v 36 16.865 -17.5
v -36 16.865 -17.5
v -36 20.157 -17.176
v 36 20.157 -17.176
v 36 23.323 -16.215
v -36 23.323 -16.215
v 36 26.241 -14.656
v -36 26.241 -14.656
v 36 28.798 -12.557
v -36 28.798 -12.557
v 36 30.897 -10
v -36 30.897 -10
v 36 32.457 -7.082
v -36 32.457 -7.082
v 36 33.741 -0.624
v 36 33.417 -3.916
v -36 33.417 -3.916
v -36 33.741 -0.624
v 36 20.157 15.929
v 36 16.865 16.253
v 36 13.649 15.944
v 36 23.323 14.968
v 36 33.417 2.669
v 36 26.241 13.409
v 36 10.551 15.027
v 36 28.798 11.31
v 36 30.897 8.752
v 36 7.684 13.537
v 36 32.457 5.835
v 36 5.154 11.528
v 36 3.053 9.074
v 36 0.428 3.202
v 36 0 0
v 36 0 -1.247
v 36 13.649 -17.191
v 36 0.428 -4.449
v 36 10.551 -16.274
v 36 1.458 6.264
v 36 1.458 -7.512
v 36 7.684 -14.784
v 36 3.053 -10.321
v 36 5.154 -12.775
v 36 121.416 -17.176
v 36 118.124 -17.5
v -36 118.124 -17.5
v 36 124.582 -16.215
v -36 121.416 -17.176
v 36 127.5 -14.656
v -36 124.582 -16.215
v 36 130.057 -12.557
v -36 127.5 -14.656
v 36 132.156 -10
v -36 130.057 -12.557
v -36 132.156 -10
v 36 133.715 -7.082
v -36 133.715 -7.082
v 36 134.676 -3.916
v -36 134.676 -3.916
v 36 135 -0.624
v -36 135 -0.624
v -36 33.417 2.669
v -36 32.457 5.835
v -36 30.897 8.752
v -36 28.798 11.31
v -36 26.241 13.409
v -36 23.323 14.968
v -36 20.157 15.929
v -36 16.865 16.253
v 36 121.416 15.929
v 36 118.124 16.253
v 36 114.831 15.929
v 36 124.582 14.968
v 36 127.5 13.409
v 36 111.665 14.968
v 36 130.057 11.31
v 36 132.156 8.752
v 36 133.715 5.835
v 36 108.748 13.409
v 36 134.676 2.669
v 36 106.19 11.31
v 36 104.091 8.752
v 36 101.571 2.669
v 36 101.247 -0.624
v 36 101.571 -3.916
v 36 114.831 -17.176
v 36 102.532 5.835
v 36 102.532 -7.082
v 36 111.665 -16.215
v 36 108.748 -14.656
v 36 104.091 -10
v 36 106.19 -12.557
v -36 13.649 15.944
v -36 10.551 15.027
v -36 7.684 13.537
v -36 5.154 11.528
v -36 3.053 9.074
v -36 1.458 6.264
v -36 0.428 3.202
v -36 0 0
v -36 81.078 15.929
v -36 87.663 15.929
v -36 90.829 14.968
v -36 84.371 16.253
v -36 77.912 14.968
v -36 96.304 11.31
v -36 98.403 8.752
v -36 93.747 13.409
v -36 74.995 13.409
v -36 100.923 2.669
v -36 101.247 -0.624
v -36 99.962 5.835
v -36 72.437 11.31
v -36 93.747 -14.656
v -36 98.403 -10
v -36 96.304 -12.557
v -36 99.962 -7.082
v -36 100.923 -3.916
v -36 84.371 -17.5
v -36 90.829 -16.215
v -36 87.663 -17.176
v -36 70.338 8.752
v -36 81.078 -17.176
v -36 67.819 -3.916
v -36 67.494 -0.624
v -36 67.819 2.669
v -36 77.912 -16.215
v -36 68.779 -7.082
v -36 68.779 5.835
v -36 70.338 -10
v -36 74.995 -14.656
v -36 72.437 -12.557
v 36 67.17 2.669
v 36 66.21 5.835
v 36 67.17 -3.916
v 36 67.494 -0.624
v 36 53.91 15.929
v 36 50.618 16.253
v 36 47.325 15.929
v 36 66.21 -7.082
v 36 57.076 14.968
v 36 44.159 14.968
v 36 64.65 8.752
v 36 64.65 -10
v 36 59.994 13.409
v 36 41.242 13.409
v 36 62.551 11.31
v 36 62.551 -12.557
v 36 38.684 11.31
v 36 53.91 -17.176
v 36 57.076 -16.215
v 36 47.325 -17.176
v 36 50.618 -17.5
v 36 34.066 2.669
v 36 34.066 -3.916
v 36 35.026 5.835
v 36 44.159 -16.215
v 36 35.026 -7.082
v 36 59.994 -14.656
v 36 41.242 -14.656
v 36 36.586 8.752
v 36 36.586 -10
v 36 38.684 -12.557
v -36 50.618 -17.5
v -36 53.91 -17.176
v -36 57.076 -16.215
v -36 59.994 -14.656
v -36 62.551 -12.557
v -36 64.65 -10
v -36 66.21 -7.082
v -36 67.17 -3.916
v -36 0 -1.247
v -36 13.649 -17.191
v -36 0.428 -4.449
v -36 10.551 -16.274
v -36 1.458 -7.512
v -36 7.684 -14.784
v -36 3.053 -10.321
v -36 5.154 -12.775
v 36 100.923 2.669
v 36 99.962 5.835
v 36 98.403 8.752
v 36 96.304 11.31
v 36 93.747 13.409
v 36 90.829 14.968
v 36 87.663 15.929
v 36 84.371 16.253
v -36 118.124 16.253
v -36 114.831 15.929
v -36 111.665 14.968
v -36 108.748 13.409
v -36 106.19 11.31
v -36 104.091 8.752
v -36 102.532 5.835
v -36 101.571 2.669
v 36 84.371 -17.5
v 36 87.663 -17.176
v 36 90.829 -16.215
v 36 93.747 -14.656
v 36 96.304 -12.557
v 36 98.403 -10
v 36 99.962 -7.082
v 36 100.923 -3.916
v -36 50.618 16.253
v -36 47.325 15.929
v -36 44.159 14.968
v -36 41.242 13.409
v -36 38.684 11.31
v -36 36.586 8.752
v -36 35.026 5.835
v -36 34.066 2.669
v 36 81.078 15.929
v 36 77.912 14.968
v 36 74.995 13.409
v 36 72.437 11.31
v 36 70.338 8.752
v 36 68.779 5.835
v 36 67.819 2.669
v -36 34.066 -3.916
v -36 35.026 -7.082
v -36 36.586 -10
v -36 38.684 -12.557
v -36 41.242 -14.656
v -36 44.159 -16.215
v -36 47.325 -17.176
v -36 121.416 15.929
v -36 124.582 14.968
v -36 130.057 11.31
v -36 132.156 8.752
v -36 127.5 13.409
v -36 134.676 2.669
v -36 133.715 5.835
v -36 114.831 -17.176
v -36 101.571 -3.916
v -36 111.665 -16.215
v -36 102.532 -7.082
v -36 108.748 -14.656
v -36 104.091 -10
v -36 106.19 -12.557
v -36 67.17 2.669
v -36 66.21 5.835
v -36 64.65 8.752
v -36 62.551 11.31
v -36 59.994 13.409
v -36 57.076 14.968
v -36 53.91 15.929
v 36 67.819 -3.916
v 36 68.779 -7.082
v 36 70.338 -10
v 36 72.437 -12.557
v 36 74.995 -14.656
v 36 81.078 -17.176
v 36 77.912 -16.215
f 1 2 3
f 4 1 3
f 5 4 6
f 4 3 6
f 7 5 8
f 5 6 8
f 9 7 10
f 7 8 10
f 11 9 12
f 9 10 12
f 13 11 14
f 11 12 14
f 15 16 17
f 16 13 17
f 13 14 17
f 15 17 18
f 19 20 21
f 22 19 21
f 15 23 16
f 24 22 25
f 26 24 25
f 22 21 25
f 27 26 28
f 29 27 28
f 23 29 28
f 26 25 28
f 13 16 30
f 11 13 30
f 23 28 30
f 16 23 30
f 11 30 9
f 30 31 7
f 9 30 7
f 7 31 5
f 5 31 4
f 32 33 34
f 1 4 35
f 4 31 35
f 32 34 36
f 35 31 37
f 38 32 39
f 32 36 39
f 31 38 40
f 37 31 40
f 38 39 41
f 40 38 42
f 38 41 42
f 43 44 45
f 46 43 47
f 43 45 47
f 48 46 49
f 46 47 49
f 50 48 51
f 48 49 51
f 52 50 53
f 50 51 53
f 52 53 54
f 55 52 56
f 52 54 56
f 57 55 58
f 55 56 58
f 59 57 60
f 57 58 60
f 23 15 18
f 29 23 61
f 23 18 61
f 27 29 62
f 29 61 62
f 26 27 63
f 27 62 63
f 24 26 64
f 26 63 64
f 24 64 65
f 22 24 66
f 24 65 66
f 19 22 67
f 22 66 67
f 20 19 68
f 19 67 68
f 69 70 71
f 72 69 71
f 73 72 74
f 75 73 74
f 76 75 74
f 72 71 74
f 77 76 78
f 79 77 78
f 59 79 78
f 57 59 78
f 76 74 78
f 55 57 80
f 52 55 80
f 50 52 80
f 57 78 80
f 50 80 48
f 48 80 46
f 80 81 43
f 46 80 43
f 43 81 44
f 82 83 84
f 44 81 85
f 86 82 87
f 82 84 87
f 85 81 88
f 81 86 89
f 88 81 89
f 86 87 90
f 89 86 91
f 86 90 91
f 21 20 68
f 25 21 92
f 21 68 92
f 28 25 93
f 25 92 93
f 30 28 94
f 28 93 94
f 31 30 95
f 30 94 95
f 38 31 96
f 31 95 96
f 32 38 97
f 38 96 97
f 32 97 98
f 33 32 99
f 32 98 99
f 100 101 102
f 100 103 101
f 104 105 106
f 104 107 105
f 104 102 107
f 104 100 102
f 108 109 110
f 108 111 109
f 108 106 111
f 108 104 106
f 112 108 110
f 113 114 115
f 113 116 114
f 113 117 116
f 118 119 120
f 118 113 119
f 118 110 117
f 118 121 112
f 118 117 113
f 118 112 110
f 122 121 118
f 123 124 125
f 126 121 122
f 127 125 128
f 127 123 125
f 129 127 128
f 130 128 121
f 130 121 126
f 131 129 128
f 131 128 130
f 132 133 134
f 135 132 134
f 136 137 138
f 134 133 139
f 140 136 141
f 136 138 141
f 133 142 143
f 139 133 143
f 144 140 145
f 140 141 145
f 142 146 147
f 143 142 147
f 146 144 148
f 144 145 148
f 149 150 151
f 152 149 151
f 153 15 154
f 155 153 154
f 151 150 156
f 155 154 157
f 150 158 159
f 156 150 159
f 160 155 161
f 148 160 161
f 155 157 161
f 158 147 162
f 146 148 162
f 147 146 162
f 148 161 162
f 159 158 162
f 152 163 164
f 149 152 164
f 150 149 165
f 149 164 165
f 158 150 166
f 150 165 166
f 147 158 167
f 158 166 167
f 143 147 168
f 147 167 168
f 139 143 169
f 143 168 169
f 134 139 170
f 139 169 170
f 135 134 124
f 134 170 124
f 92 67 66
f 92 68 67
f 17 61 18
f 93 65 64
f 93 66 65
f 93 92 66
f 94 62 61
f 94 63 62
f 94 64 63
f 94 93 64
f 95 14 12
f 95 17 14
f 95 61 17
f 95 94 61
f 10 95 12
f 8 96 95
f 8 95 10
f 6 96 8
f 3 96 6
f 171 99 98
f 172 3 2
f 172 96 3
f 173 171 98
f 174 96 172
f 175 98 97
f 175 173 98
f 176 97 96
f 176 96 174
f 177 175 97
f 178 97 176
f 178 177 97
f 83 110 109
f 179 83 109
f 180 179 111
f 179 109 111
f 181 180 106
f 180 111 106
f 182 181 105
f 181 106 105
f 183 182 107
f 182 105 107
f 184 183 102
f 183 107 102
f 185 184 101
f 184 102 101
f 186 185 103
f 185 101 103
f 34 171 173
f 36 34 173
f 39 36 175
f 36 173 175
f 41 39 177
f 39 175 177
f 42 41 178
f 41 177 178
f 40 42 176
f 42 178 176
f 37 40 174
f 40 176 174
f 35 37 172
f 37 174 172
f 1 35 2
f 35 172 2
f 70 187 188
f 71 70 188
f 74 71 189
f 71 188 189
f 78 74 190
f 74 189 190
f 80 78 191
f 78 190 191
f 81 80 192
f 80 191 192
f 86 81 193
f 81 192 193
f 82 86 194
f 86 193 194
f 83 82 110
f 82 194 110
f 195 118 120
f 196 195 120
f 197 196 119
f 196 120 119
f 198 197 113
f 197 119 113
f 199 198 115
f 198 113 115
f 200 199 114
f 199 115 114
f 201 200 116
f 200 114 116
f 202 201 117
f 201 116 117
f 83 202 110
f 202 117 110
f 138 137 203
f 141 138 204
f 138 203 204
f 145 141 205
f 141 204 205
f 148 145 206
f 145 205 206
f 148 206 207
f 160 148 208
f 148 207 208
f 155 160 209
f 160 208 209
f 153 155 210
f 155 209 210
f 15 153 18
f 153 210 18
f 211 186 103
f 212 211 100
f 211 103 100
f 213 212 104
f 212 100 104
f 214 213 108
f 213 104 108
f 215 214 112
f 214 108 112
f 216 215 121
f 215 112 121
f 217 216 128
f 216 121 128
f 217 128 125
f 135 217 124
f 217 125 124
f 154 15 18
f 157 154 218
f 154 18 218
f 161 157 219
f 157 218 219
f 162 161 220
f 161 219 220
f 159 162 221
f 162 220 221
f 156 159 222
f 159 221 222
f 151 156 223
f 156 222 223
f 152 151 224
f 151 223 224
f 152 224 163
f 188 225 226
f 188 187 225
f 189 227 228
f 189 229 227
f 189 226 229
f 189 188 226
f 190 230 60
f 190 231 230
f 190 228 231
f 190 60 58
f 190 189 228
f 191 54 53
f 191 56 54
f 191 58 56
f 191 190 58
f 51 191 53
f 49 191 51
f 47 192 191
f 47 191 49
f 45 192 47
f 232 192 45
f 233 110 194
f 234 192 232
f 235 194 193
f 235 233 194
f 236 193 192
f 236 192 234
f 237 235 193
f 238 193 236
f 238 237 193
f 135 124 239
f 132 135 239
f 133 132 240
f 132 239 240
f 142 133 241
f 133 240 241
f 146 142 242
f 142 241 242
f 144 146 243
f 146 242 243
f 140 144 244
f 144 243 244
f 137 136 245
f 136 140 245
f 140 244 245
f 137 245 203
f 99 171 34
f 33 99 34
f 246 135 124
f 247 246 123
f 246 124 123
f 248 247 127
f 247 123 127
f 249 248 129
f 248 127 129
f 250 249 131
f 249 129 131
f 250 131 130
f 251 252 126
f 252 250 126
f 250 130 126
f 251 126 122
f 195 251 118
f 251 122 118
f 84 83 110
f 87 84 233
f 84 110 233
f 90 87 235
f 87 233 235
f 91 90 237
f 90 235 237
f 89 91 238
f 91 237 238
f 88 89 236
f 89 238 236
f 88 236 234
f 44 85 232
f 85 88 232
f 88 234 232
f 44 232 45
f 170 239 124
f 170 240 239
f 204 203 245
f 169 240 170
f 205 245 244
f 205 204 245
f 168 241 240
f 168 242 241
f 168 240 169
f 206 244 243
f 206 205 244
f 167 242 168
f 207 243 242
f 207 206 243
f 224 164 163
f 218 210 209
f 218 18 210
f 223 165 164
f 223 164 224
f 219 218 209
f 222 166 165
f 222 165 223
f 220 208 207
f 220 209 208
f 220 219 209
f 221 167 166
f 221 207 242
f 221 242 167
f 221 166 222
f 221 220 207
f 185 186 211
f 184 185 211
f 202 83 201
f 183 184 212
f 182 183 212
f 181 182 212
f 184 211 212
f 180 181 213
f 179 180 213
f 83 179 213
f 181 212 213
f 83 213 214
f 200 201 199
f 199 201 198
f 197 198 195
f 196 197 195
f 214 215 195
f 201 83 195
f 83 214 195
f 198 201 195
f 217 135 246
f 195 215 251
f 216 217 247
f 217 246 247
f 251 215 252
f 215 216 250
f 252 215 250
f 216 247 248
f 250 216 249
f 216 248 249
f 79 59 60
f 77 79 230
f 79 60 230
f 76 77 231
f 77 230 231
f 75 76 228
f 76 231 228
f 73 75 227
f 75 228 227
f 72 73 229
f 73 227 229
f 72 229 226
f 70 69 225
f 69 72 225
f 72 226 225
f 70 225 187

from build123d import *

# Parameters (mm, degrees)
SKETCH2_W           = 72
SKETCH2_H           = 35
BOSS_EXTRUDE1_DEPTH = 135
CUT_EXTRUDE1_DEPTH  = 135


with BuildPart() as part:
    # Sketch2 → Boss-Extrude1 (new body)
    with BuildSketch(Plane(origin=(0, 0, 0), x_dir=(1, 0, 0), z_dir=(0, 1, 0))):
        Rectangle(SKETCH2_W, SKETCH2_H)
    extrude(amount=BOSS_EXTRUDE1_DEPTH)

    # Sketch3 → Cut-Extrude1 (cut)
    with BuildSketch(Plane.ZY.offset(36)):
        with BuildLine():
            ThreePointArc((-0.623559533, 101.247119066), (-12.55700503, 106.190114037), (-17.5, 118.123559533))
            Line((-17.5, 118.123559533), (-17.5, 84.370678599))
            ThreePointArc((-17.5, 84.370678599), (-12.55700503, 96.304124096), (-0.623559533, 101.247119066))
        make_face()
        with BuildLine():
            Line((-0.623559437, 135), (-17.5, 135))
            Line((-17.5, 135), (-17.5, 118.123559533))
            ThreePointArc((-17.5, 118.123559533), (-12.557004996, 130.057005063), (-0.623559437, 135))
        make_face()
        with BuildLine():
            Line((17.5, 135), (-0.623559437, 135))
            ThreePointArc((-0.623559437, 135), (11.309885997, 130.057004996), (16.252880934, 118.123559533))
            ThreePointArc((16.252880934, 118.123559533), (11.309885963, 106.190114037), (-0.623559533, 101.247119066))
            ThreePointArc((-0.623559533, 101.247119066), (11.309885963, 96.304124096), (16.252880934, 84.370678599))
            ThreePointArc((16.252880934, 84.370678599), (11.309885963, 72.437233103), (-0.623559533, 67.494238132))
            ThreePointArc((-0.623559533, 67.494238132), (11.309885963, 62.551243162), (16.252880934, 50.617797665))
            ThreePointArc((16.252880934, 50.617797665), (11.30988595, 38.684352155), (-0.623559572, 33.741357198))
            ThreePointArc((-0.623559572, 33.741357198), (11.30988595, 28.798362241), (16.252880934, 16.864916731))
            ThreePointArc((16.252880934, 16.864916731), (11.528347893, 5.154007768), (0, 0))
            Line((0, 0), (17.5, 0))
            Line((17.5, 0), (17.5, 135))
        make_face()
        with BuildLine():
            ThreePointArc((-0.623559533, 67.494238132), (-12.55700503, 72.437233103), (-17.5, 84.370678599))
            Line((-17.5, 84.370678599), (-17.5, 50.617797777))
            ThreePointArc((-17.5, 50.617797777), (-12.55700499, 62.551243201), (-0.623559533, 67.494238132))
        make_face()
        with BuildLine():
            ThreePointArc((-0.623559572, 33.741357198), (-12.557005083, 38.684352222), (-17.5, 50.617797777))
            Line((-17.5, 50.617797777), (-17.5, 16.864916675))
            ThreePointArc((-17.5, 16.864916675), (-12.557005063, 28.798362194), (-0.623559572, 33.741357198))
        make_face()
        with BuildLine():
            ThreePointArc((-1.247119066, 0), (-12.775466939, 5.154007747), (-17.5, 16.864916675))
            Line((-17.5, 16.864916675), (-17.5, 0))
            Line((-17.5, 0), (-1.247119066, 0))
        make_face()
    extrude(amount=-CUT_EXTRUDE1_DEPTH, mode=Mode.SUBTRACT)


solid = part.part
